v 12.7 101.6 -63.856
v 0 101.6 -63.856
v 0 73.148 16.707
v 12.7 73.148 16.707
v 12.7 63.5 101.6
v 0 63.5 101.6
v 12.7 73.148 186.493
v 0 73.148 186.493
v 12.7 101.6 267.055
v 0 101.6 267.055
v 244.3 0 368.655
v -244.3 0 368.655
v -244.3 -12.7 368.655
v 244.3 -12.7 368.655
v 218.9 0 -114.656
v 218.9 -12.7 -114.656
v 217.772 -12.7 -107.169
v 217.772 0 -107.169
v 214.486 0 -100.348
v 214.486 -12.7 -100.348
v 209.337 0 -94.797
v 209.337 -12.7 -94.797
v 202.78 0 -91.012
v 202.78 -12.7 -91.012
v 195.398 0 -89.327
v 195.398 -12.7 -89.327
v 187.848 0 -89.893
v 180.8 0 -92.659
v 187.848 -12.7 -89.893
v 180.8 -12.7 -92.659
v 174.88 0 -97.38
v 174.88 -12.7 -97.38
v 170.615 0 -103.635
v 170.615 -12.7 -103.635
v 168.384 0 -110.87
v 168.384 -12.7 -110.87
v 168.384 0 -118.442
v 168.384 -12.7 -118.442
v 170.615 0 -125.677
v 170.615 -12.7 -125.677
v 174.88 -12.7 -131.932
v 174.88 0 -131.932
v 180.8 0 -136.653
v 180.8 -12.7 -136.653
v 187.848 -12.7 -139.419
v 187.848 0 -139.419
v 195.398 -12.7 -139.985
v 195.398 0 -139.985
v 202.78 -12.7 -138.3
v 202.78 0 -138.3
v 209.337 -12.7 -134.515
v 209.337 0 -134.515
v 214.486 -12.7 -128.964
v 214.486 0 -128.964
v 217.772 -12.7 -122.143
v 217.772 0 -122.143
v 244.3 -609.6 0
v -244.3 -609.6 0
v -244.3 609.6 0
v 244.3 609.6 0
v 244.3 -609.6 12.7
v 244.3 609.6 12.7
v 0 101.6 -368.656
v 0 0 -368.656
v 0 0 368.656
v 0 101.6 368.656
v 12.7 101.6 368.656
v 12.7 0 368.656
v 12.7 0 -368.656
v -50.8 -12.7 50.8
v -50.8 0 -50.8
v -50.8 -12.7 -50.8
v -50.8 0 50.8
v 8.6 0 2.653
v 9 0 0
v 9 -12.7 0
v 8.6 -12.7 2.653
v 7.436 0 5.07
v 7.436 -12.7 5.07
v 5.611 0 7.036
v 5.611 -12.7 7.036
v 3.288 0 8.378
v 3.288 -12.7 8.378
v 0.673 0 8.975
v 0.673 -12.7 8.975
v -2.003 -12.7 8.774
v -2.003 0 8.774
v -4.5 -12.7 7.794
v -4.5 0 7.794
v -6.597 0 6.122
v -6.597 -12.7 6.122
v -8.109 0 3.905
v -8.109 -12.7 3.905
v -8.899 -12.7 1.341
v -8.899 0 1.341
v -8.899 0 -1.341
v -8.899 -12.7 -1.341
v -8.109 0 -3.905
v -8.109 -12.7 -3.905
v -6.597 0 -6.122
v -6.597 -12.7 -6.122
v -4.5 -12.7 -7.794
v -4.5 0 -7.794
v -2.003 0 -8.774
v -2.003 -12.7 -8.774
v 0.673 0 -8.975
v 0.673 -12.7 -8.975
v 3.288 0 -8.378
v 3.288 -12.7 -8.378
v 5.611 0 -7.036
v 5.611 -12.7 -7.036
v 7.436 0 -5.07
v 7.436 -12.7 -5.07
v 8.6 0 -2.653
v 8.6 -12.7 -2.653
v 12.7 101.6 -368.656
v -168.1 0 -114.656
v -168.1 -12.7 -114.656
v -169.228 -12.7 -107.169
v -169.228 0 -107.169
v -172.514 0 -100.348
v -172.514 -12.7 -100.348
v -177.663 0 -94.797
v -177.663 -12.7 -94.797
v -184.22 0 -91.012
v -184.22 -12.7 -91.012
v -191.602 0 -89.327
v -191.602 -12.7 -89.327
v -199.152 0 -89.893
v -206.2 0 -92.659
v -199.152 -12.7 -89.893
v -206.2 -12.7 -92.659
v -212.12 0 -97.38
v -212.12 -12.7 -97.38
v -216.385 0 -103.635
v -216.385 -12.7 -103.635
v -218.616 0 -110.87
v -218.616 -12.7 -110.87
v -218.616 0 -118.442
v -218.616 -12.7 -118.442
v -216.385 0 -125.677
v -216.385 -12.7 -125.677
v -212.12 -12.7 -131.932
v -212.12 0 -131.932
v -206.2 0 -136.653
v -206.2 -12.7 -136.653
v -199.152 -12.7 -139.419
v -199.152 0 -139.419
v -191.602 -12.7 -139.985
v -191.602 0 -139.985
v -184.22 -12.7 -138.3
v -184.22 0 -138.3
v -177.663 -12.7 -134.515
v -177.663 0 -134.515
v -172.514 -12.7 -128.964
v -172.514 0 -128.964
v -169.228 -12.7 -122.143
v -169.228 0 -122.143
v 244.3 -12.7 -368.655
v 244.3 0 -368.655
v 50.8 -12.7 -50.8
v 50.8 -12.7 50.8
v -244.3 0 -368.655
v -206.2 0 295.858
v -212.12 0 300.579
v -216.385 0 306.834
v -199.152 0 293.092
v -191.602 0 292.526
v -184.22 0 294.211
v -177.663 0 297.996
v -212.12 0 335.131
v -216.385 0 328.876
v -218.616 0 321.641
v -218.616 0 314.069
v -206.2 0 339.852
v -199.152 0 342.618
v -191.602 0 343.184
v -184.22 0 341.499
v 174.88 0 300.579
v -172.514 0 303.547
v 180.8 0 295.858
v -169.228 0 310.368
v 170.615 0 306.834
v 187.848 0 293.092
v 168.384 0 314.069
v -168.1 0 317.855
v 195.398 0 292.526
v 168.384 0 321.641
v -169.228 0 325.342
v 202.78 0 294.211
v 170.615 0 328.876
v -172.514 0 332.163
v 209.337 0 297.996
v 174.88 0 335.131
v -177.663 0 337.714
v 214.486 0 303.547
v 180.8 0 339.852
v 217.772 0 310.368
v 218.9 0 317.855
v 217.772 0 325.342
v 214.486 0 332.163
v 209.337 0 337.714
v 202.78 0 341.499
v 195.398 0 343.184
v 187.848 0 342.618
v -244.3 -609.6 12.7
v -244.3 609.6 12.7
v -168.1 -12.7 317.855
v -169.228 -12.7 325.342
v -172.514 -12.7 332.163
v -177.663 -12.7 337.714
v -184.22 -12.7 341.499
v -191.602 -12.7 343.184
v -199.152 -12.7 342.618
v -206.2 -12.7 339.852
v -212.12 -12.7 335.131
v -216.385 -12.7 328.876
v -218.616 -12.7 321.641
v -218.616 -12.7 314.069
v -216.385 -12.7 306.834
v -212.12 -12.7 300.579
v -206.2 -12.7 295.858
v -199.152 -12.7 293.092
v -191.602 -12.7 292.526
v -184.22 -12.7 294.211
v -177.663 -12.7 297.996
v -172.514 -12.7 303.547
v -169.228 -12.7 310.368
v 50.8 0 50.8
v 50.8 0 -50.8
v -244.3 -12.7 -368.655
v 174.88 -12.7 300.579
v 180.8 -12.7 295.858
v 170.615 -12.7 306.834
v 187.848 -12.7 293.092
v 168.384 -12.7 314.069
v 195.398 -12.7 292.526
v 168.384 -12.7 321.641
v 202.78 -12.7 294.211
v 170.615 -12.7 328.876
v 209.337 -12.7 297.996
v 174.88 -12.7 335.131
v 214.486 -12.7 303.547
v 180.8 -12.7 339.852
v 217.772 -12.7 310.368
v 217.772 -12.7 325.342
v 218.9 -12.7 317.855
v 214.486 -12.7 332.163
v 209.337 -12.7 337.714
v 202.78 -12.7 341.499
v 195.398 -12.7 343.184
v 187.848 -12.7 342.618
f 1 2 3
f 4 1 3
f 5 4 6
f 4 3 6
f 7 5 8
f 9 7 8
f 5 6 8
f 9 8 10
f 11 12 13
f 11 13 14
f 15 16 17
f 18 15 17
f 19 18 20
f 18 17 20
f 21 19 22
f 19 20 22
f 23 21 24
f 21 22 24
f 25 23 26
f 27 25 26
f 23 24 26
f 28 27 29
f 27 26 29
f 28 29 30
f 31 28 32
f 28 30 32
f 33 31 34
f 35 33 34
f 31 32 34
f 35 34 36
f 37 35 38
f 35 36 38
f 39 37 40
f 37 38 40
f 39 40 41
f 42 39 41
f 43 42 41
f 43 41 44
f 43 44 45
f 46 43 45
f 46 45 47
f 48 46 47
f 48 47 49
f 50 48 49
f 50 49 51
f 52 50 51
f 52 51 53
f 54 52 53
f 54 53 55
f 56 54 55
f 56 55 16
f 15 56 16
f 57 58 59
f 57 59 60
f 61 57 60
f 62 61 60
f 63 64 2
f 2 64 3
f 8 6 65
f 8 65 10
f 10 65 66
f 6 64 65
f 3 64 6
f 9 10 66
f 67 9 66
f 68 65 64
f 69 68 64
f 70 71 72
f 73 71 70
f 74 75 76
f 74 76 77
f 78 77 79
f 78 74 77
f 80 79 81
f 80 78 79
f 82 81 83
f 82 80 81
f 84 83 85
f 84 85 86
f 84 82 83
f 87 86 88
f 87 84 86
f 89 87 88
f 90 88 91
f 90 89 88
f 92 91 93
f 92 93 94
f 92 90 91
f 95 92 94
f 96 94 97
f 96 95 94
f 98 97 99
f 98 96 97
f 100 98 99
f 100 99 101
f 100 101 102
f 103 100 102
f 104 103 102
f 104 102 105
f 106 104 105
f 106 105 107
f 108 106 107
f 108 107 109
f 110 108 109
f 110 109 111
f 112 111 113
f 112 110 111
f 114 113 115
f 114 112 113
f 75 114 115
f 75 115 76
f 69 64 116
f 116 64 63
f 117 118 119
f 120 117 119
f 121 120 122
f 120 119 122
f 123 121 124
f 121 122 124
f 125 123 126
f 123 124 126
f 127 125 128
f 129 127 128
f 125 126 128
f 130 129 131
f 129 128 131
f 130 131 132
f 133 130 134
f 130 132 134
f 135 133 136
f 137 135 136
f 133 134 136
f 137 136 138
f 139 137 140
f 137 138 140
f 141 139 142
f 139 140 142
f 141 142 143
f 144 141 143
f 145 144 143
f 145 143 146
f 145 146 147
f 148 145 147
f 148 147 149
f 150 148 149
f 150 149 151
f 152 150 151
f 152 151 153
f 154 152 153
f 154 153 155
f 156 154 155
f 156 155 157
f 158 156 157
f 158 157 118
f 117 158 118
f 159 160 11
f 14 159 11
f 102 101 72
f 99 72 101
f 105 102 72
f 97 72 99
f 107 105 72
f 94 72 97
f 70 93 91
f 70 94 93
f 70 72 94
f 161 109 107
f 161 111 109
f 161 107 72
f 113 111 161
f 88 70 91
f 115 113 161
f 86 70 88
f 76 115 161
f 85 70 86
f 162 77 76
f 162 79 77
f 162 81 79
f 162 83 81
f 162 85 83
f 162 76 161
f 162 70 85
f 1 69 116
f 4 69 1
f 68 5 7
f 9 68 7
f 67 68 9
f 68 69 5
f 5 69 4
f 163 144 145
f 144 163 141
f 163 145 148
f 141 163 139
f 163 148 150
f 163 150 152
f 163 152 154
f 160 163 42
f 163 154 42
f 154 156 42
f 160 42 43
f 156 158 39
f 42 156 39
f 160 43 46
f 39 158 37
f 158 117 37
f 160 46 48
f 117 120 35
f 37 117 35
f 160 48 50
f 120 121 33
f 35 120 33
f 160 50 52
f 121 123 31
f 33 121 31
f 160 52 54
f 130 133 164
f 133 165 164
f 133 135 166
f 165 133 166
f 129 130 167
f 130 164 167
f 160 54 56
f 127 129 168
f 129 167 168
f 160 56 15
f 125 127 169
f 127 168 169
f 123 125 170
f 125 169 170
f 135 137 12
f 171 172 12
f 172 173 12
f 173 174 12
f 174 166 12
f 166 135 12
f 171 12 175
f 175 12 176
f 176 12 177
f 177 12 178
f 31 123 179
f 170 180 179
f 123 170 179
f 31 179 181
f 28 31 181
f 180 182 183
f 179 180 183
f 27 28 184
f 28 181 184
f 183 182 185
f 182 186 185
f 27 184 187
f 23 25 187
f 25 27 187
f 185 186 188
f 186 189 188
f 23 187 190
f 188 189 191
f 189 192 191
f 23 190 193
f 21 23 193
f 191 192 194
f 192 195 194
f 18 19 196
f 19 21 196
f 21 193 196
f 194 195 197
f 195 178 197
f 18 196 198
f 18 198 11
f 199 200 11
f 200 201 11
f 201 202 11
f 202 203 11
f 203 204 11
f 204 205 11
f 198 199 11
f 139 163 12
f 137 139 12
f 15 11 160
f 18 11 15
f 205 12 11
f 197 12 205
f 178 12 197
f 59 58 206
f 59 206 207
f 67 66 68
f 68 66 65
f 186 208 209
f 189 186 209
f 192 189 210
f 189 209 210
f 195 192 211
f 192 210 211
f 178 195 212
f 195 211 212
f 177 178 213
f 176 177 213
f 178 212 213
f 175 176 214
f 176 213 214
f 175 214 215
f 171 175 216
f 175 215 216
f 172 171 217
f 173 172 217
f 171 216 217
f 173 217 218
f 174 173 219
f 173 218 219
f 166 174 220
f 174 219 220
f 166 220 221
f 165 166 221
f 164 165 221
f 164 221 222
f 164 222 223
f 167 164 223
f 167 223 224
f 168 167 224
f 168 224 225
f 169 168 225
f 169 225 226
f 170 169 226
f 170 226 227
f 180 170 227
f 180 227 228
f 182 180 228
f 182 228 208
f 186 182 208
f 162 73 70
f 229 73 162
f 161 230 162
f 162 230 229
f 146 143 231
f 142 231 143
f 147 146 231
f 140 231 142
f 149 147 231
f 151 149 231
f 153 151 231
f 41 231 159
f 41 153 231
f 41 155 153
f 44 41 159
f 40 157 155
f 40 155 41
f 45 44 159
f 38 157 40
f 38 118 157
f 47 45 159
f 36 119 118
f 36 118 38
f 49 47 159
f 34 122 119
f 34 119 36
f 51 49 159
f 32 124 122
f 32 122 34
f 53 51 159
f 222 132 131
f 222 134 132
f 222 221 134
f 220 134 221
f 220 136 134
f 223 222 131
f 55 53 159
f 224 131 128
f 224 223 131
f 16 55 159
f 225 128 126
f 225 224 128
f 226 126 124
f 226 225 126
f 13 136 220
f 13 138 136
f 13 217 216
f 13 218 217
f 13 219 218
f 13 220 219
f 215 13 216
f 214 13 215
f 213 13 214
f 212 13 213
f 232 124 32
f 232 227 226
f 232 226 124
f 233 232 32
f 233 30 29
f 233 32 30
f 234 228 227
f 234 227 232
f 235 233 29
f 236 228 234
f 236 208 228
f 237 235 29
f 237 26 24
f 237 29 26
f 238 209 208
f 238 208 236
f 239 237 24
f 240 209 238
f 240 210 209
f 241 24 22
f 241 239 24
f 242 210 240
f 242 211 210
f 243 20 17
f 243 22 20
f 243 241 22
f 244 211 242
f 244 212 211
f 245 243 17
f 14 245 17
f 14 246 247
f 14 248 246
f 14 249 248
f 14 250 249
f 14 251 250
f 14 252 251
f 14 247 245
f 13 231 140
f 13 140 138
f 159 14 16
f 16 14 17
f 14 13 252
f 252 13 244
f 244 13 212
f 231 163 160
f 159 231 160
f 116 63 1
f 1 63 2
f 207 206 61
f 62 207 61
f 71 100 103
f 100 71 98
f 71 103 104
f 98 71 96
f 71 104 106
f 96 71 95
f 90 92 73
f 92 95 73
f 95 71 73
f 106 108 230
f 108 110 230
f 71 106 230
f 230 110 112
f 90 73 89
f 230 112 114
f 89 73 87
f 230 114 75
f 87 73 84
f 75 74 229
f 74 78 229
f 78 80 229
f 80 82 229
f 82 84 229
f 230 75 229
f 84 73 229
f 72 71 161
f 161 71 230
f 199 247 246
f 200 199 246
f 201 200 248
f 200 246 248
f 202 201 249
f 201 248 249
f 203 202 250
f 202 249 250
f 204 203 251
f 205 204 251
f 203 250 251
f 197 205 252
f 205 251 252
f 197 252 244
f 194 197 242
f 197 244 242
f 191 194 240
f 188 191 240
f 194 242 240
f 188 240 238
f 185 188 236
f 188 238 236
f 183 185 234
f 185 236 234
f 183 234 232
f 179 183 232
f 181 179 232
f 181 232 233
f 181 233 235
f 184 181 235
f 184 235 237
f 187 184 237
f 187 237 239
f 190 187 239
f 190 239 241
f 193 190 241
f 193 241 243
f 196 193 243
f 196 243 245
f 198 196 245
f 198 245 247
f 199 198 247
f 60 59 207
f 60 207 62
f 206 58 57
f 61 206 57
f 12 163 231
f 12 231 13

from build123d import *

# Parameters (mm, degrees)
F1_W      = 101.6
F1_H      = 101.6
F1_R      = 9
F2_DEPTH  = 12.7
F4_DEPTH  = 12.7
F5_W      = 488.6
F5_H      = 737.31
F6_DEPTH  = 12.7
F7_W      = 488.6
F7_H      = 1219.2
F8_DEPTH  = 12.7
F9_R      = 25.4
F10_DEPTH = 622.301


with BuildPart() as f2:
    # F1 (on Front) → F2 (new body)
    with BuildSketch(Plane.XZ):
        Rectangle(F1_W, F1_H)
        Circle(F1_R, mode=Mode.SUBTRACT)
    extrude(amount=F2_DEPTH)


with BuildPart() as f4:
    # F3 (on Right) → F4 (new body)
    with BuildSketch(Plane.YZ):
        with BuildLine():
            Line((101.6, 368.6555), (0, 368.6555))
            Line((0, 368.6555), (0, -368.6555))
            Line((0, -368.6555), (101.6, -368.6555))
            Line((101.6, -368.6555), (101.6, -63.8555))
            ThreePointArc((101.6, -63.8555), (63.5, 101.6), (101.6, 267.0555))
            Line((101.6, 267.0555), (101.6, 368.6555))
        make_face()
    extrude(amount=F4_DEPTH)


with BuildPart() as f6:
    # F5 (on Front) → F6 (new body)
    with BuildSketch(Plane.XZ):
        Rectangle(F5_W, F5_H)
    extrude(amount=F6_DEPTH)

    # F9 (on face) → F10 (cut, through all)
    with BuildSketch(Plane.XZ.offset(12.7)):
        with Locations((-193.5, 317.855)):
            Circle(F9_R)
        with Locations((193.5, 317.855)):
            Circle(F9_R)
        with Locations((-193.5, -114.656)):
            Circle(F9_R)
        with Locations((193.5, -114.656)):
            Circle(F9_R)
    extrude(amount=-F10_DEPTH, mode=Mode.SUBTRACT)


with BuildPart() as f8:
    # F7 (on Top) → F8 (new body)
    with BuildSketch(Plane.XY):
        Rectangle(F7_W, F7_H)
    extrude(amount=F8_DEPTH)


solid = Compound([f2.part, f4.part, f6.part, f8.part])
